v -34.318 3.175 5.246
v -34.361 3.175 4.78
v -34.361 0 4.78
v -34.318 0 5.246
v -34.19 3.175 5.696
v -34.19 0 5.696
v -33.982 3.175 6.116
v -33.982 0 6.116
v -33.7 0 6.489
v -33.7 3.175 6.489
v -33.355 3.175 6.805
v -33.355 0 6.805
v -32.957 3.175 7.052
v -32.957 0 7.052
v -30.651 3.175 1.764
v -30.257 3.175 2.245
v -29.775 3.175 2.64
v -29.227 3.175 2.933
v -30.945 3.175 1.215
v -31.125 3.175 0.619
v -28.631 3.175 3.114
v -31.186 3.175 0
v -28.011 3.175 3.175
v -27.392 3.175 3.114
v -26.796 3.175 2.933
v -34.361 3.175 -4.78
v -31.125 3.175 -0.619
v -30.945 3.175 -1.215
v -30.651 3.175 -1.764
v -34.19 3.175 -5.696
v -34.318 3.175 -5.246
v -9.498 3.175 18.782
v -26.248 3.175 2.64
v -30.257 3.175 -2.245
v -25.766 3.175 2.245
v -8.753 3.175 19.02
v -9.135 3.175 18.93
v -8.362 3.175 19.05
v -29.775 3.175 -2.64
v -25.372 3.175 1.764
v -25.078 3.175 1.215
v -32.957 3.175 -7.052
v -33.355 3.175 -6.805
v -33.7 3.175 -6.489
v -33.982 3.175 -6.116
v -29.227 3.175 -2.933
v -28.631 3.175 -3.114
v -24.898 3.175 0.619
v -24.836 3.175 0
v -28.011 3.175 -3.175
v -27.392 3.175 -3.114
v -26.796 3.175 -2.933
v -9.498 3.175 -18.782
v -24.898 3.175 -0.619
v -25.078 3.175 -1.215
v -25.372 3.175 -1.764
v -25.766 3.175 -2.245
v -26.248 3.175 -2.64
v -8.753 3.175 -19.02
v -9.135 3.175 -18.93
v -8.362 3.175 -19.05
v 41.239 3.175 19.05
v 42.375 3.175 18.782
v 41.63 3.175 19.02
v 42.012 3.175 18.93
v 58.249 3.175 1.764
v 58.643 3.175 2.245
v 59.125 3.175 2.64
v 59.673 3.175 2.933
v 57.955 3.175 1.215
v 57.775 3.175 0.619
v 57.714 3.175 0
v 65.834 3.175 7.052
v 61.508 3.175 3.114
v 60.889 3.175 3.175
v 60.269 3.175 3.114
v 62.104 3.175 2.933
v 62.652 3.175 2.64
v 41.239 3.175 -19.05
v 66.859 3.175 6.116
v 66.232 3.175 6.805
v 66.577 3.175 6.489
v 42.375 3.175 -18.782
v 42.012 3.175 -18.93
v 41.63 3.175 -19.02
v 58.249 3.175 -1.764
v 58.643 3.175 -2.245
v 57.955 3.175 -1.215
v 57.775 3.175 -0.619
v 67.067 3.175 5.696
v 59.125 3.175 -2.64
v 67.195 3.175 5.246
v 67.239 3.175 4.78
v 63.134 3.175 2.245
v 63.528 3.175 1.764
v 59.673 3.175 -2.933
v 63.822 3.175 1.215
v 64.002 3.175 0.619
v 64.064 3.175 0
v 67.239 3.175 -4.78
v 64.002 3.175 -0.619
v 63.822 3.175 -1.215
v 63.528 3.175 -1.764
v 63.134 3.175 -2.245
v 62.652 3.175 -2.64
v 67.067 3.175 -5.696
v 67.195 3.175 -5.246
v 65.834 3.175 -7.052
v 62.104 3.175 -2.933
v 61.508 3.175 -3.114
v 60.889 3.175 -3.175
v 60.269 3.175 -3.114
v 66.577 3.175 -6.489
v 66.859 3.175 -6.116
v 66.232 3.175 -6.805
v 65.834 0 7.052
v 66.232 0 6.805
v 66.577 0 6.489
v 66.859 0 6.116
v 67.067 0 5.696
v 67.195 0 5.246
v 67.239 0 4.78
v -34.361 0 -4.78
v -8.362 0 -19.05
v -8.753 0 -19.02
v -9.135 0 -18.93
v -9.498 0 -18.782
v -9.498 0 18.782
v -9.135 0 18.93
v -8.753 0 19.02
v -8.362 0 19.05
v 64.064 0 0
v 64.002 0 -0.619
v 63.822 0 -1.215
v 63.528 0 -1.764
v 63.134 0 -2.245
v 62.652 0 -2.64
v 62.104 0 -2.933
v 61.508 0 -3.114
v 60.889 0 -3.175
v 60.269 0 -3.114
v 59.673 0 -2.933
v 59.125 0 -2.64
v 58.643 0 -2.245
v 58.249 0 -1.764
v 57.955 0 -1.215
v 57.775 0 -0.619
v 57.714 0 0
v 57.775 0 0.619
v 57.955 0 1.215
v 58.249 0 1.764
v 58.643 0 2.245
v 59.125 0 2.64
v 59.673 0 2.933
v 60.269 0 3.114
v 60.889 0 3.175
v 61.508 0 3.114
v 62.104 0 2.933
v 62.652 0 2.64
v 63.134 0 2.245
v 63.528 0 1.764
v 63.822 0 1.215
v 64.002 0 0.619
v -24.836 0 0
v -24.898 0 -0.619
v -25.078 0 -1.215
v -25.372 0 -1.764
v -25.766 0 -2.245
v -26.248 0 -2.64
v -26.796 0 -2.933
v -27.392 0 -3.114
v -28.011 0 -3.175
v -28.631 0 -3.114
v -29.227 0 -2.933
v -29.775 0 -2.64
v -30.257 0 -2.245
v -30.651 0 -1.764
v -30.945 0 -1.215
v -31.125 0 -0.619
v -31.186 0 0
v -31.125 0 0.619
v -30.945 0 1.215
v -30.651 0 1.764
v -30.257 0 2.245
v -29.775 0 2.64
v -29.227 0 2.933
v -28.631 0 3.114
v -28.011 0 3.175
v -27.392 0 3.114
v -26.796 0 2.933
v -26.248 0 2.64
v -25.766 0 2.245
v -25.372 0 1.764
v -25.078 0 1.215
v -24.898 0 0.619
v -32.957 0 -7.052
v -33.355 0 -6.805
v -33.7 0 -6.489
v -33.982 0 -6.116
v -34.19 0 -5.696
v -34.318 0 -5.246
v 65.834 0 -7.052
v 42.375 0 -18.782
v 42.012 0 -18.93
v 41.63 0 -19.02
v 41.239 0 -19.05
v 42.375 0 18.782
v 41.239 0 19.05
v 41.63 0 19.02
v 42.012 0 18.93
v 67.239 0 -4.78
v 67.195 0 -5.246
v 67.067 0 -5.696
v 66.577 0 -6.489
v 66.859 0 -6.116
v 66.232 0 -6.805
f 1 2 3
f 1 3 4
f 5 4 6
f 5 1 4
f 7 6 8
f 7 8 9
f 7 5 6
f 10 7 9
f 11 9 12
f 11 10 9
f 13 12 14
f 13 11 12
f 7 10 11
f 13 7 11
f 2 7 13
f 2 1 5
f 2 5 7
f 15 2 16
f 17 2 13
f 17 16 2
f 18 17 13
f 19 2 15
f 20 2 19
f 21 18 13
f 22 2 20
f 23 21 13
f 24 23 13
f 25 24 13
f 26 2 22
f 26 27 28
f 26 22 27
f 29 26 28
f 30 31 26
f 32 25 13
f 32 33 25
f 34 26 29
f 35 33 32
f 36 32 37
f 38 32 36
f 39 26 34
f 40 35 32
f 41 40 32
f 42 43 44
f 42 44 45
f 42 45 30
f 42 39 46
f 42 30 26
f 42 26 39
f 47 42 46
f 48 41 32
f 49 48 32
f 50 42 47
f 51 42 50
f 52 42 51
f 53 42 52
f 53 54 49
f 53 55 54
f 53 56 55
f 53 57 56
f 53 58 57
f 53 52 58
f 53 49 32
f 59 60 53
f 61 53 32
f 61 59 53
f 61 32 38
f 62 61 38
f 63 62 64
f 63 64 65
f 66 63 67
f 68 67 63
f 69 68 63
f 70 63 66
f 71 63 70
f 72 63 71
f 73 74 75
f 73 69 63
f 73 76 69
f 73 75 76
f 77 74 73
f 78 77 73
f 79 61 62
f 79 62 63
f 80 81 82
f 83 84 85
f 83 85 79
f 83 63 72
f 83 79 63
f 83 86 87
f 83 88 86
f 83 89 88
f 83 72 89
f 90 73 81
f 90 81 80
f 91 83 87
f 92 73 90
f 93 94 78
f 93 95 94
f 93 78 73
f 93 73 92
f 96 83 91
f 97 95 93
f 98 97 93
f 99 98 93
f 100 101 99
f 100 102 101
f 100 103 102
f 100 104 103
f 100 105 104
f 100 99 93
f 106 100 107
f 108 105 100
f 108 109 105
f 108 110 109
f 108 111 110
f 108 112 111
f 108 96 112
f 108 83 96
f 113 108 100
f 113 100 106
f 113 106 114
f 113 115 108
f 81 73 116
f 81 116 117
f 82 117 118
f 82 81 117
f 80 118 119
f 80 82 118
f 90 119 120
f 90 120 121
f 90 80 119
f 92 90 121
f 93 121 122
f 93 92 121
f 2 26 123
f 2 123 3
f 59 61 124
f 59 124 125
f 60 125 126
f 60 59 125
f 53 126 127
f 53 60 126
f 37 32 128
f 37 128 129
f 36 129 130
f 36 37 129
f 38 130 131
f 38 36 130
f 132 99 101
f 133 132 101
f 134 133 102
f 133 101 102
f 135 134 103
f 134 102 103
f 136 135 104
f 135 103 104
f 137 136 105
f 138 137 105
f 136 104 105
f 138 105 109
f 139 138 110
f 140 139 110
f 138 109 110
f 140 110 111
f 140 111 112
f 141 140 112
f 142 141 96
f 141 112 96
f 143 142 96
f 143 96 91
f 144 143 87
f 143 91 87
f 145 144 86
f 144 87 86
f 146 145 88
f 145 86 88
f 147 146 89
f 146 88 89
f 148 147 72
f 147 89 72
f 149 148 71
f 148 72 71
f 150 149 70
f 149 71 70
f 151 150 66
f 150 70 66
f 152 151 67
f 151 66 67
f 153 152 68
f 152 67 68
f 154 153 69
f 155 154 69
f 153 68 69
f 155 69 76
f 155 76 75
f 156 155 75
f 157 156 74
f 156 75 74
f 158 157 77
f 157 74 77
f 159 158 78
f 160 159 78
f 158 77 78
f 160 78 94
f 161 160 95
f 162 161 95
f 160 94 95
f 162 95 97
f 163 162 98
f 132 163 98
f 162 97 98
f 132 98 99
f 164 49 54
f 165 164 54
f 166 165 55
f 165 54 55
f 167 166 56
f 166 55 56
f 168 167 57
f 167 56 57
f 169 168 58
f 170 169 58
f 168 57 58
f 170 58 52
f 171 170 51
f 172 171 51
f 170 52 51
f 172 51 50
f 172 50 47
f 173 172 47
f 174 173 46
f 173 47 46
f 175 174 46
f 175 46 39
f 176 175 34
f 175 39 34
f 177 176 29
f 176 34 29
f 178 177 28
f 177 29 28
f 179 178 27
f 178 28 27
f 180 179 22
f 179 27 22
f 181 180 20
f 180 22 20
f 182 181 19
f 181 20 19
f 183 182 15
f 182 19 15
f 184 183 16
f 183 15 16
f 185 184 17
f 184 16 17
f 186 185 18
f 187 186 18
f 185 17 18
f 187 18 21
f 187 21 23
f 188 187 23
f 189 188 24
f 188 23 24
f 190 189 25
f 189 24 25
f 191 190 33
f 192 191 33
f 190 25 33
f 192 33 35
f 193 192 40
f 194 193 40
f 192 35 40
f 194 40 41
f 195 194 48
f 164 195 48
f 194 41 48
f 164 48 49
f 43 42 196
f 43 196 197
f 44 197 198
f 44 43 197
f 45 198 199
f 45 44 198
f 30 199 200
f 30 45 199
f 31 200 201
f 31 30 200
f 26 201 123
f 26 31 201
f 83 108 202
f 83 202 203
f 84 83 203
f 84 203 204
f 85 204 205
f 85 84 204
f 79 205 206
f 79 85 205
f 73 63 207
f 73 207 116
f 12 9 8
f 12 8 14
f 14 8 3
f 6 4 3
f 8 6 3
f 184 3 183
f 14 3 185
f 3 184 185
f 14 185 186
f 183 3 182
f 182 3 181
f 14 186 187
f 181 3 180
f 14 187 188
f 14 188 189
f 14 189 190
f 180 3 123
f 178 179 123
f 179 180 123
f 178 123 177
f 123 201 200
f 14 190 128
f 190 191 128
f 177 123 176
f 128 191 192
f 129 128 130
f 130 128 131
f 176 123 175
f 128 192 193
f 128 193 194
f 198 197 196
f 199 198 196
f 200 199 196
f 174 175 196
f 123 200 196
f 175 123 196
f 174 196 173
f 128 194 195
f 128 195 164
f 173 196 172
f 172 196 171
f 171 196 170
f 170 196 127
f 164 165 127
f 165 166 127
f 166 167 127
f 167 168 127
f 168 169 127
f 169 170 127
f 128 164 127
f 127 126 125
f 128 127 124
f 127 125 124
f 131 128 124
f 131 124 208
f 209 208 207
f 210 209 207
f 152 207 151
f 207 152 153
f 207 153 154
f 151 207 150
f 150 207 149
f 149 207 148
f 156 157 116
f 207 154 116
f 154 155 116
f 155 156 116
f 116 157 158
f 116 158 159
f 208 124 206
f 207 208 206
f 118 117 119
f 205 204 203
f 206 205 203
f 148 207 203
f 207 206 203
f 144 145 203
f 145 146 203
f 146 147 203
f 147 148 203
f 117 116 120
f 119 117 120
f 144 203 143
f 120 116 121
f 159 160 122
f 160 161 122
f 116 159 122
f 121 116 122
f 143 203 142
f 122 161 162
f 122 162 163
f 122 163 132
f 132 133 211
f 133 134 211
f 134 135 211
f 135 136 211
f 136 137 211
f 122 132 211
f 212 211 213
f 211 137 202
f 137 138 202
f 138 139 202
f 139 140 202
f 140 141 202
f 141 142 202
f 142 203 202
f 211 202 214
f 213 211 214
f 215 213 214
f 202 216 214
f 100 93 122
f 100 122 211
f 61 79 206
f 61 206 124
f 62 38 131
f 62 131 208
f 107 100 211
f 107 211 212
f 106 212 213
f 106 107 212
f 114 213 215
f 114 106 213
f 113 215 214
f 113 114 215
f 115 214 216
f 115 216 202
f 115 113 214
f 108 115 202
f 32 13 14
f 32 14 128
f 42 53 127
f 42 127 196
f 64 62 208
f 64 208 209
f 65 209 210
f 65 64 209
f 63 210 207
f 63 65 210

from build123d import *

# Parameters (mm, degrees)
SKETCH1_R           = 3.175
BOSS_EXTRUDE1_DEPTH = 3.175


with BuildPart() as part:
    # Sketch1 → Boss-Extrude1 (new body)
    with BuildSketch(Plane(origin=(0, 3.175, 0), x_dir=(1, 0, 0), z_dir=(0, 1, 0))):
        with BuildLine():
            Line((67.238500214, -4.780193669), (67.238500214, 4.780193669))
            ThreePointArc((67.238500214, 4.780193669), (66.859153267, 6.115550693), (65.834422746, 7.052038734))
            Line((65.834422746, 7.052038734), (42.374810083, 18.781845065))
            ThreePointArc((42.374810083, 18.781845065), (41.822459969, 18.982052433), (41.238887551, 19.05))
            Line((41.238887551, 19.05), (-8.361887124, 19.05))
            ThreePointArc((-8.361887124, 19.05), (-8.945459542, 18.982052433), (-9.497809656, 18.781845065))
            Line((-9.497809656, 18.781845065), (-32.957422319, 7.052038734))
            ThreePointArc((-32.957422319, 7.052038734), (-33.98215284, 6.115550693), (-34.361499786, 4.780193669))
            Line((-34.361499786, 4.780193669), (-34.361499786, -4.780193669))
            ThreePointArc((-34.361499786, -4.780193669), (-33.98215284, -6.115550693), (-32.957422319, -7.052038734))
            Line((-32.957422319, -7.052038734), (-9.497809656, -18.781845065))
            ThreePointArc((-9.497809656, -18.781845065), (-8.945459542, -18.982052433), (-8.361887124, -19.05))
            Line((-8.361887124, -19.05), (41.238887551, -19.05))
            ThreePointArc((41.238887551, -19.05), (41.822459969, -18.982052433), (42.374810083, -18.781845065))
            Line((42.374810083, -18.781845065), (65.834422746, -7.052038734))
            ThreePointArc((65.834422746, -7.052038734), (66.859153267, -6.115550693), (67.238500214, -4.780193669))
        make_face()
        with Locations((-28.011499786, 0)):
            Circle(SKETCH1_R, mode=Mode.SUBTRACT)
        with Locations((60.888500214, 0)):
            Circle(SKETCH1_R, mode=Mode.SUBTRACT)
    extrude(amount=-BOSS_EXTRUDE1_DEPTH)


solid = part.part
